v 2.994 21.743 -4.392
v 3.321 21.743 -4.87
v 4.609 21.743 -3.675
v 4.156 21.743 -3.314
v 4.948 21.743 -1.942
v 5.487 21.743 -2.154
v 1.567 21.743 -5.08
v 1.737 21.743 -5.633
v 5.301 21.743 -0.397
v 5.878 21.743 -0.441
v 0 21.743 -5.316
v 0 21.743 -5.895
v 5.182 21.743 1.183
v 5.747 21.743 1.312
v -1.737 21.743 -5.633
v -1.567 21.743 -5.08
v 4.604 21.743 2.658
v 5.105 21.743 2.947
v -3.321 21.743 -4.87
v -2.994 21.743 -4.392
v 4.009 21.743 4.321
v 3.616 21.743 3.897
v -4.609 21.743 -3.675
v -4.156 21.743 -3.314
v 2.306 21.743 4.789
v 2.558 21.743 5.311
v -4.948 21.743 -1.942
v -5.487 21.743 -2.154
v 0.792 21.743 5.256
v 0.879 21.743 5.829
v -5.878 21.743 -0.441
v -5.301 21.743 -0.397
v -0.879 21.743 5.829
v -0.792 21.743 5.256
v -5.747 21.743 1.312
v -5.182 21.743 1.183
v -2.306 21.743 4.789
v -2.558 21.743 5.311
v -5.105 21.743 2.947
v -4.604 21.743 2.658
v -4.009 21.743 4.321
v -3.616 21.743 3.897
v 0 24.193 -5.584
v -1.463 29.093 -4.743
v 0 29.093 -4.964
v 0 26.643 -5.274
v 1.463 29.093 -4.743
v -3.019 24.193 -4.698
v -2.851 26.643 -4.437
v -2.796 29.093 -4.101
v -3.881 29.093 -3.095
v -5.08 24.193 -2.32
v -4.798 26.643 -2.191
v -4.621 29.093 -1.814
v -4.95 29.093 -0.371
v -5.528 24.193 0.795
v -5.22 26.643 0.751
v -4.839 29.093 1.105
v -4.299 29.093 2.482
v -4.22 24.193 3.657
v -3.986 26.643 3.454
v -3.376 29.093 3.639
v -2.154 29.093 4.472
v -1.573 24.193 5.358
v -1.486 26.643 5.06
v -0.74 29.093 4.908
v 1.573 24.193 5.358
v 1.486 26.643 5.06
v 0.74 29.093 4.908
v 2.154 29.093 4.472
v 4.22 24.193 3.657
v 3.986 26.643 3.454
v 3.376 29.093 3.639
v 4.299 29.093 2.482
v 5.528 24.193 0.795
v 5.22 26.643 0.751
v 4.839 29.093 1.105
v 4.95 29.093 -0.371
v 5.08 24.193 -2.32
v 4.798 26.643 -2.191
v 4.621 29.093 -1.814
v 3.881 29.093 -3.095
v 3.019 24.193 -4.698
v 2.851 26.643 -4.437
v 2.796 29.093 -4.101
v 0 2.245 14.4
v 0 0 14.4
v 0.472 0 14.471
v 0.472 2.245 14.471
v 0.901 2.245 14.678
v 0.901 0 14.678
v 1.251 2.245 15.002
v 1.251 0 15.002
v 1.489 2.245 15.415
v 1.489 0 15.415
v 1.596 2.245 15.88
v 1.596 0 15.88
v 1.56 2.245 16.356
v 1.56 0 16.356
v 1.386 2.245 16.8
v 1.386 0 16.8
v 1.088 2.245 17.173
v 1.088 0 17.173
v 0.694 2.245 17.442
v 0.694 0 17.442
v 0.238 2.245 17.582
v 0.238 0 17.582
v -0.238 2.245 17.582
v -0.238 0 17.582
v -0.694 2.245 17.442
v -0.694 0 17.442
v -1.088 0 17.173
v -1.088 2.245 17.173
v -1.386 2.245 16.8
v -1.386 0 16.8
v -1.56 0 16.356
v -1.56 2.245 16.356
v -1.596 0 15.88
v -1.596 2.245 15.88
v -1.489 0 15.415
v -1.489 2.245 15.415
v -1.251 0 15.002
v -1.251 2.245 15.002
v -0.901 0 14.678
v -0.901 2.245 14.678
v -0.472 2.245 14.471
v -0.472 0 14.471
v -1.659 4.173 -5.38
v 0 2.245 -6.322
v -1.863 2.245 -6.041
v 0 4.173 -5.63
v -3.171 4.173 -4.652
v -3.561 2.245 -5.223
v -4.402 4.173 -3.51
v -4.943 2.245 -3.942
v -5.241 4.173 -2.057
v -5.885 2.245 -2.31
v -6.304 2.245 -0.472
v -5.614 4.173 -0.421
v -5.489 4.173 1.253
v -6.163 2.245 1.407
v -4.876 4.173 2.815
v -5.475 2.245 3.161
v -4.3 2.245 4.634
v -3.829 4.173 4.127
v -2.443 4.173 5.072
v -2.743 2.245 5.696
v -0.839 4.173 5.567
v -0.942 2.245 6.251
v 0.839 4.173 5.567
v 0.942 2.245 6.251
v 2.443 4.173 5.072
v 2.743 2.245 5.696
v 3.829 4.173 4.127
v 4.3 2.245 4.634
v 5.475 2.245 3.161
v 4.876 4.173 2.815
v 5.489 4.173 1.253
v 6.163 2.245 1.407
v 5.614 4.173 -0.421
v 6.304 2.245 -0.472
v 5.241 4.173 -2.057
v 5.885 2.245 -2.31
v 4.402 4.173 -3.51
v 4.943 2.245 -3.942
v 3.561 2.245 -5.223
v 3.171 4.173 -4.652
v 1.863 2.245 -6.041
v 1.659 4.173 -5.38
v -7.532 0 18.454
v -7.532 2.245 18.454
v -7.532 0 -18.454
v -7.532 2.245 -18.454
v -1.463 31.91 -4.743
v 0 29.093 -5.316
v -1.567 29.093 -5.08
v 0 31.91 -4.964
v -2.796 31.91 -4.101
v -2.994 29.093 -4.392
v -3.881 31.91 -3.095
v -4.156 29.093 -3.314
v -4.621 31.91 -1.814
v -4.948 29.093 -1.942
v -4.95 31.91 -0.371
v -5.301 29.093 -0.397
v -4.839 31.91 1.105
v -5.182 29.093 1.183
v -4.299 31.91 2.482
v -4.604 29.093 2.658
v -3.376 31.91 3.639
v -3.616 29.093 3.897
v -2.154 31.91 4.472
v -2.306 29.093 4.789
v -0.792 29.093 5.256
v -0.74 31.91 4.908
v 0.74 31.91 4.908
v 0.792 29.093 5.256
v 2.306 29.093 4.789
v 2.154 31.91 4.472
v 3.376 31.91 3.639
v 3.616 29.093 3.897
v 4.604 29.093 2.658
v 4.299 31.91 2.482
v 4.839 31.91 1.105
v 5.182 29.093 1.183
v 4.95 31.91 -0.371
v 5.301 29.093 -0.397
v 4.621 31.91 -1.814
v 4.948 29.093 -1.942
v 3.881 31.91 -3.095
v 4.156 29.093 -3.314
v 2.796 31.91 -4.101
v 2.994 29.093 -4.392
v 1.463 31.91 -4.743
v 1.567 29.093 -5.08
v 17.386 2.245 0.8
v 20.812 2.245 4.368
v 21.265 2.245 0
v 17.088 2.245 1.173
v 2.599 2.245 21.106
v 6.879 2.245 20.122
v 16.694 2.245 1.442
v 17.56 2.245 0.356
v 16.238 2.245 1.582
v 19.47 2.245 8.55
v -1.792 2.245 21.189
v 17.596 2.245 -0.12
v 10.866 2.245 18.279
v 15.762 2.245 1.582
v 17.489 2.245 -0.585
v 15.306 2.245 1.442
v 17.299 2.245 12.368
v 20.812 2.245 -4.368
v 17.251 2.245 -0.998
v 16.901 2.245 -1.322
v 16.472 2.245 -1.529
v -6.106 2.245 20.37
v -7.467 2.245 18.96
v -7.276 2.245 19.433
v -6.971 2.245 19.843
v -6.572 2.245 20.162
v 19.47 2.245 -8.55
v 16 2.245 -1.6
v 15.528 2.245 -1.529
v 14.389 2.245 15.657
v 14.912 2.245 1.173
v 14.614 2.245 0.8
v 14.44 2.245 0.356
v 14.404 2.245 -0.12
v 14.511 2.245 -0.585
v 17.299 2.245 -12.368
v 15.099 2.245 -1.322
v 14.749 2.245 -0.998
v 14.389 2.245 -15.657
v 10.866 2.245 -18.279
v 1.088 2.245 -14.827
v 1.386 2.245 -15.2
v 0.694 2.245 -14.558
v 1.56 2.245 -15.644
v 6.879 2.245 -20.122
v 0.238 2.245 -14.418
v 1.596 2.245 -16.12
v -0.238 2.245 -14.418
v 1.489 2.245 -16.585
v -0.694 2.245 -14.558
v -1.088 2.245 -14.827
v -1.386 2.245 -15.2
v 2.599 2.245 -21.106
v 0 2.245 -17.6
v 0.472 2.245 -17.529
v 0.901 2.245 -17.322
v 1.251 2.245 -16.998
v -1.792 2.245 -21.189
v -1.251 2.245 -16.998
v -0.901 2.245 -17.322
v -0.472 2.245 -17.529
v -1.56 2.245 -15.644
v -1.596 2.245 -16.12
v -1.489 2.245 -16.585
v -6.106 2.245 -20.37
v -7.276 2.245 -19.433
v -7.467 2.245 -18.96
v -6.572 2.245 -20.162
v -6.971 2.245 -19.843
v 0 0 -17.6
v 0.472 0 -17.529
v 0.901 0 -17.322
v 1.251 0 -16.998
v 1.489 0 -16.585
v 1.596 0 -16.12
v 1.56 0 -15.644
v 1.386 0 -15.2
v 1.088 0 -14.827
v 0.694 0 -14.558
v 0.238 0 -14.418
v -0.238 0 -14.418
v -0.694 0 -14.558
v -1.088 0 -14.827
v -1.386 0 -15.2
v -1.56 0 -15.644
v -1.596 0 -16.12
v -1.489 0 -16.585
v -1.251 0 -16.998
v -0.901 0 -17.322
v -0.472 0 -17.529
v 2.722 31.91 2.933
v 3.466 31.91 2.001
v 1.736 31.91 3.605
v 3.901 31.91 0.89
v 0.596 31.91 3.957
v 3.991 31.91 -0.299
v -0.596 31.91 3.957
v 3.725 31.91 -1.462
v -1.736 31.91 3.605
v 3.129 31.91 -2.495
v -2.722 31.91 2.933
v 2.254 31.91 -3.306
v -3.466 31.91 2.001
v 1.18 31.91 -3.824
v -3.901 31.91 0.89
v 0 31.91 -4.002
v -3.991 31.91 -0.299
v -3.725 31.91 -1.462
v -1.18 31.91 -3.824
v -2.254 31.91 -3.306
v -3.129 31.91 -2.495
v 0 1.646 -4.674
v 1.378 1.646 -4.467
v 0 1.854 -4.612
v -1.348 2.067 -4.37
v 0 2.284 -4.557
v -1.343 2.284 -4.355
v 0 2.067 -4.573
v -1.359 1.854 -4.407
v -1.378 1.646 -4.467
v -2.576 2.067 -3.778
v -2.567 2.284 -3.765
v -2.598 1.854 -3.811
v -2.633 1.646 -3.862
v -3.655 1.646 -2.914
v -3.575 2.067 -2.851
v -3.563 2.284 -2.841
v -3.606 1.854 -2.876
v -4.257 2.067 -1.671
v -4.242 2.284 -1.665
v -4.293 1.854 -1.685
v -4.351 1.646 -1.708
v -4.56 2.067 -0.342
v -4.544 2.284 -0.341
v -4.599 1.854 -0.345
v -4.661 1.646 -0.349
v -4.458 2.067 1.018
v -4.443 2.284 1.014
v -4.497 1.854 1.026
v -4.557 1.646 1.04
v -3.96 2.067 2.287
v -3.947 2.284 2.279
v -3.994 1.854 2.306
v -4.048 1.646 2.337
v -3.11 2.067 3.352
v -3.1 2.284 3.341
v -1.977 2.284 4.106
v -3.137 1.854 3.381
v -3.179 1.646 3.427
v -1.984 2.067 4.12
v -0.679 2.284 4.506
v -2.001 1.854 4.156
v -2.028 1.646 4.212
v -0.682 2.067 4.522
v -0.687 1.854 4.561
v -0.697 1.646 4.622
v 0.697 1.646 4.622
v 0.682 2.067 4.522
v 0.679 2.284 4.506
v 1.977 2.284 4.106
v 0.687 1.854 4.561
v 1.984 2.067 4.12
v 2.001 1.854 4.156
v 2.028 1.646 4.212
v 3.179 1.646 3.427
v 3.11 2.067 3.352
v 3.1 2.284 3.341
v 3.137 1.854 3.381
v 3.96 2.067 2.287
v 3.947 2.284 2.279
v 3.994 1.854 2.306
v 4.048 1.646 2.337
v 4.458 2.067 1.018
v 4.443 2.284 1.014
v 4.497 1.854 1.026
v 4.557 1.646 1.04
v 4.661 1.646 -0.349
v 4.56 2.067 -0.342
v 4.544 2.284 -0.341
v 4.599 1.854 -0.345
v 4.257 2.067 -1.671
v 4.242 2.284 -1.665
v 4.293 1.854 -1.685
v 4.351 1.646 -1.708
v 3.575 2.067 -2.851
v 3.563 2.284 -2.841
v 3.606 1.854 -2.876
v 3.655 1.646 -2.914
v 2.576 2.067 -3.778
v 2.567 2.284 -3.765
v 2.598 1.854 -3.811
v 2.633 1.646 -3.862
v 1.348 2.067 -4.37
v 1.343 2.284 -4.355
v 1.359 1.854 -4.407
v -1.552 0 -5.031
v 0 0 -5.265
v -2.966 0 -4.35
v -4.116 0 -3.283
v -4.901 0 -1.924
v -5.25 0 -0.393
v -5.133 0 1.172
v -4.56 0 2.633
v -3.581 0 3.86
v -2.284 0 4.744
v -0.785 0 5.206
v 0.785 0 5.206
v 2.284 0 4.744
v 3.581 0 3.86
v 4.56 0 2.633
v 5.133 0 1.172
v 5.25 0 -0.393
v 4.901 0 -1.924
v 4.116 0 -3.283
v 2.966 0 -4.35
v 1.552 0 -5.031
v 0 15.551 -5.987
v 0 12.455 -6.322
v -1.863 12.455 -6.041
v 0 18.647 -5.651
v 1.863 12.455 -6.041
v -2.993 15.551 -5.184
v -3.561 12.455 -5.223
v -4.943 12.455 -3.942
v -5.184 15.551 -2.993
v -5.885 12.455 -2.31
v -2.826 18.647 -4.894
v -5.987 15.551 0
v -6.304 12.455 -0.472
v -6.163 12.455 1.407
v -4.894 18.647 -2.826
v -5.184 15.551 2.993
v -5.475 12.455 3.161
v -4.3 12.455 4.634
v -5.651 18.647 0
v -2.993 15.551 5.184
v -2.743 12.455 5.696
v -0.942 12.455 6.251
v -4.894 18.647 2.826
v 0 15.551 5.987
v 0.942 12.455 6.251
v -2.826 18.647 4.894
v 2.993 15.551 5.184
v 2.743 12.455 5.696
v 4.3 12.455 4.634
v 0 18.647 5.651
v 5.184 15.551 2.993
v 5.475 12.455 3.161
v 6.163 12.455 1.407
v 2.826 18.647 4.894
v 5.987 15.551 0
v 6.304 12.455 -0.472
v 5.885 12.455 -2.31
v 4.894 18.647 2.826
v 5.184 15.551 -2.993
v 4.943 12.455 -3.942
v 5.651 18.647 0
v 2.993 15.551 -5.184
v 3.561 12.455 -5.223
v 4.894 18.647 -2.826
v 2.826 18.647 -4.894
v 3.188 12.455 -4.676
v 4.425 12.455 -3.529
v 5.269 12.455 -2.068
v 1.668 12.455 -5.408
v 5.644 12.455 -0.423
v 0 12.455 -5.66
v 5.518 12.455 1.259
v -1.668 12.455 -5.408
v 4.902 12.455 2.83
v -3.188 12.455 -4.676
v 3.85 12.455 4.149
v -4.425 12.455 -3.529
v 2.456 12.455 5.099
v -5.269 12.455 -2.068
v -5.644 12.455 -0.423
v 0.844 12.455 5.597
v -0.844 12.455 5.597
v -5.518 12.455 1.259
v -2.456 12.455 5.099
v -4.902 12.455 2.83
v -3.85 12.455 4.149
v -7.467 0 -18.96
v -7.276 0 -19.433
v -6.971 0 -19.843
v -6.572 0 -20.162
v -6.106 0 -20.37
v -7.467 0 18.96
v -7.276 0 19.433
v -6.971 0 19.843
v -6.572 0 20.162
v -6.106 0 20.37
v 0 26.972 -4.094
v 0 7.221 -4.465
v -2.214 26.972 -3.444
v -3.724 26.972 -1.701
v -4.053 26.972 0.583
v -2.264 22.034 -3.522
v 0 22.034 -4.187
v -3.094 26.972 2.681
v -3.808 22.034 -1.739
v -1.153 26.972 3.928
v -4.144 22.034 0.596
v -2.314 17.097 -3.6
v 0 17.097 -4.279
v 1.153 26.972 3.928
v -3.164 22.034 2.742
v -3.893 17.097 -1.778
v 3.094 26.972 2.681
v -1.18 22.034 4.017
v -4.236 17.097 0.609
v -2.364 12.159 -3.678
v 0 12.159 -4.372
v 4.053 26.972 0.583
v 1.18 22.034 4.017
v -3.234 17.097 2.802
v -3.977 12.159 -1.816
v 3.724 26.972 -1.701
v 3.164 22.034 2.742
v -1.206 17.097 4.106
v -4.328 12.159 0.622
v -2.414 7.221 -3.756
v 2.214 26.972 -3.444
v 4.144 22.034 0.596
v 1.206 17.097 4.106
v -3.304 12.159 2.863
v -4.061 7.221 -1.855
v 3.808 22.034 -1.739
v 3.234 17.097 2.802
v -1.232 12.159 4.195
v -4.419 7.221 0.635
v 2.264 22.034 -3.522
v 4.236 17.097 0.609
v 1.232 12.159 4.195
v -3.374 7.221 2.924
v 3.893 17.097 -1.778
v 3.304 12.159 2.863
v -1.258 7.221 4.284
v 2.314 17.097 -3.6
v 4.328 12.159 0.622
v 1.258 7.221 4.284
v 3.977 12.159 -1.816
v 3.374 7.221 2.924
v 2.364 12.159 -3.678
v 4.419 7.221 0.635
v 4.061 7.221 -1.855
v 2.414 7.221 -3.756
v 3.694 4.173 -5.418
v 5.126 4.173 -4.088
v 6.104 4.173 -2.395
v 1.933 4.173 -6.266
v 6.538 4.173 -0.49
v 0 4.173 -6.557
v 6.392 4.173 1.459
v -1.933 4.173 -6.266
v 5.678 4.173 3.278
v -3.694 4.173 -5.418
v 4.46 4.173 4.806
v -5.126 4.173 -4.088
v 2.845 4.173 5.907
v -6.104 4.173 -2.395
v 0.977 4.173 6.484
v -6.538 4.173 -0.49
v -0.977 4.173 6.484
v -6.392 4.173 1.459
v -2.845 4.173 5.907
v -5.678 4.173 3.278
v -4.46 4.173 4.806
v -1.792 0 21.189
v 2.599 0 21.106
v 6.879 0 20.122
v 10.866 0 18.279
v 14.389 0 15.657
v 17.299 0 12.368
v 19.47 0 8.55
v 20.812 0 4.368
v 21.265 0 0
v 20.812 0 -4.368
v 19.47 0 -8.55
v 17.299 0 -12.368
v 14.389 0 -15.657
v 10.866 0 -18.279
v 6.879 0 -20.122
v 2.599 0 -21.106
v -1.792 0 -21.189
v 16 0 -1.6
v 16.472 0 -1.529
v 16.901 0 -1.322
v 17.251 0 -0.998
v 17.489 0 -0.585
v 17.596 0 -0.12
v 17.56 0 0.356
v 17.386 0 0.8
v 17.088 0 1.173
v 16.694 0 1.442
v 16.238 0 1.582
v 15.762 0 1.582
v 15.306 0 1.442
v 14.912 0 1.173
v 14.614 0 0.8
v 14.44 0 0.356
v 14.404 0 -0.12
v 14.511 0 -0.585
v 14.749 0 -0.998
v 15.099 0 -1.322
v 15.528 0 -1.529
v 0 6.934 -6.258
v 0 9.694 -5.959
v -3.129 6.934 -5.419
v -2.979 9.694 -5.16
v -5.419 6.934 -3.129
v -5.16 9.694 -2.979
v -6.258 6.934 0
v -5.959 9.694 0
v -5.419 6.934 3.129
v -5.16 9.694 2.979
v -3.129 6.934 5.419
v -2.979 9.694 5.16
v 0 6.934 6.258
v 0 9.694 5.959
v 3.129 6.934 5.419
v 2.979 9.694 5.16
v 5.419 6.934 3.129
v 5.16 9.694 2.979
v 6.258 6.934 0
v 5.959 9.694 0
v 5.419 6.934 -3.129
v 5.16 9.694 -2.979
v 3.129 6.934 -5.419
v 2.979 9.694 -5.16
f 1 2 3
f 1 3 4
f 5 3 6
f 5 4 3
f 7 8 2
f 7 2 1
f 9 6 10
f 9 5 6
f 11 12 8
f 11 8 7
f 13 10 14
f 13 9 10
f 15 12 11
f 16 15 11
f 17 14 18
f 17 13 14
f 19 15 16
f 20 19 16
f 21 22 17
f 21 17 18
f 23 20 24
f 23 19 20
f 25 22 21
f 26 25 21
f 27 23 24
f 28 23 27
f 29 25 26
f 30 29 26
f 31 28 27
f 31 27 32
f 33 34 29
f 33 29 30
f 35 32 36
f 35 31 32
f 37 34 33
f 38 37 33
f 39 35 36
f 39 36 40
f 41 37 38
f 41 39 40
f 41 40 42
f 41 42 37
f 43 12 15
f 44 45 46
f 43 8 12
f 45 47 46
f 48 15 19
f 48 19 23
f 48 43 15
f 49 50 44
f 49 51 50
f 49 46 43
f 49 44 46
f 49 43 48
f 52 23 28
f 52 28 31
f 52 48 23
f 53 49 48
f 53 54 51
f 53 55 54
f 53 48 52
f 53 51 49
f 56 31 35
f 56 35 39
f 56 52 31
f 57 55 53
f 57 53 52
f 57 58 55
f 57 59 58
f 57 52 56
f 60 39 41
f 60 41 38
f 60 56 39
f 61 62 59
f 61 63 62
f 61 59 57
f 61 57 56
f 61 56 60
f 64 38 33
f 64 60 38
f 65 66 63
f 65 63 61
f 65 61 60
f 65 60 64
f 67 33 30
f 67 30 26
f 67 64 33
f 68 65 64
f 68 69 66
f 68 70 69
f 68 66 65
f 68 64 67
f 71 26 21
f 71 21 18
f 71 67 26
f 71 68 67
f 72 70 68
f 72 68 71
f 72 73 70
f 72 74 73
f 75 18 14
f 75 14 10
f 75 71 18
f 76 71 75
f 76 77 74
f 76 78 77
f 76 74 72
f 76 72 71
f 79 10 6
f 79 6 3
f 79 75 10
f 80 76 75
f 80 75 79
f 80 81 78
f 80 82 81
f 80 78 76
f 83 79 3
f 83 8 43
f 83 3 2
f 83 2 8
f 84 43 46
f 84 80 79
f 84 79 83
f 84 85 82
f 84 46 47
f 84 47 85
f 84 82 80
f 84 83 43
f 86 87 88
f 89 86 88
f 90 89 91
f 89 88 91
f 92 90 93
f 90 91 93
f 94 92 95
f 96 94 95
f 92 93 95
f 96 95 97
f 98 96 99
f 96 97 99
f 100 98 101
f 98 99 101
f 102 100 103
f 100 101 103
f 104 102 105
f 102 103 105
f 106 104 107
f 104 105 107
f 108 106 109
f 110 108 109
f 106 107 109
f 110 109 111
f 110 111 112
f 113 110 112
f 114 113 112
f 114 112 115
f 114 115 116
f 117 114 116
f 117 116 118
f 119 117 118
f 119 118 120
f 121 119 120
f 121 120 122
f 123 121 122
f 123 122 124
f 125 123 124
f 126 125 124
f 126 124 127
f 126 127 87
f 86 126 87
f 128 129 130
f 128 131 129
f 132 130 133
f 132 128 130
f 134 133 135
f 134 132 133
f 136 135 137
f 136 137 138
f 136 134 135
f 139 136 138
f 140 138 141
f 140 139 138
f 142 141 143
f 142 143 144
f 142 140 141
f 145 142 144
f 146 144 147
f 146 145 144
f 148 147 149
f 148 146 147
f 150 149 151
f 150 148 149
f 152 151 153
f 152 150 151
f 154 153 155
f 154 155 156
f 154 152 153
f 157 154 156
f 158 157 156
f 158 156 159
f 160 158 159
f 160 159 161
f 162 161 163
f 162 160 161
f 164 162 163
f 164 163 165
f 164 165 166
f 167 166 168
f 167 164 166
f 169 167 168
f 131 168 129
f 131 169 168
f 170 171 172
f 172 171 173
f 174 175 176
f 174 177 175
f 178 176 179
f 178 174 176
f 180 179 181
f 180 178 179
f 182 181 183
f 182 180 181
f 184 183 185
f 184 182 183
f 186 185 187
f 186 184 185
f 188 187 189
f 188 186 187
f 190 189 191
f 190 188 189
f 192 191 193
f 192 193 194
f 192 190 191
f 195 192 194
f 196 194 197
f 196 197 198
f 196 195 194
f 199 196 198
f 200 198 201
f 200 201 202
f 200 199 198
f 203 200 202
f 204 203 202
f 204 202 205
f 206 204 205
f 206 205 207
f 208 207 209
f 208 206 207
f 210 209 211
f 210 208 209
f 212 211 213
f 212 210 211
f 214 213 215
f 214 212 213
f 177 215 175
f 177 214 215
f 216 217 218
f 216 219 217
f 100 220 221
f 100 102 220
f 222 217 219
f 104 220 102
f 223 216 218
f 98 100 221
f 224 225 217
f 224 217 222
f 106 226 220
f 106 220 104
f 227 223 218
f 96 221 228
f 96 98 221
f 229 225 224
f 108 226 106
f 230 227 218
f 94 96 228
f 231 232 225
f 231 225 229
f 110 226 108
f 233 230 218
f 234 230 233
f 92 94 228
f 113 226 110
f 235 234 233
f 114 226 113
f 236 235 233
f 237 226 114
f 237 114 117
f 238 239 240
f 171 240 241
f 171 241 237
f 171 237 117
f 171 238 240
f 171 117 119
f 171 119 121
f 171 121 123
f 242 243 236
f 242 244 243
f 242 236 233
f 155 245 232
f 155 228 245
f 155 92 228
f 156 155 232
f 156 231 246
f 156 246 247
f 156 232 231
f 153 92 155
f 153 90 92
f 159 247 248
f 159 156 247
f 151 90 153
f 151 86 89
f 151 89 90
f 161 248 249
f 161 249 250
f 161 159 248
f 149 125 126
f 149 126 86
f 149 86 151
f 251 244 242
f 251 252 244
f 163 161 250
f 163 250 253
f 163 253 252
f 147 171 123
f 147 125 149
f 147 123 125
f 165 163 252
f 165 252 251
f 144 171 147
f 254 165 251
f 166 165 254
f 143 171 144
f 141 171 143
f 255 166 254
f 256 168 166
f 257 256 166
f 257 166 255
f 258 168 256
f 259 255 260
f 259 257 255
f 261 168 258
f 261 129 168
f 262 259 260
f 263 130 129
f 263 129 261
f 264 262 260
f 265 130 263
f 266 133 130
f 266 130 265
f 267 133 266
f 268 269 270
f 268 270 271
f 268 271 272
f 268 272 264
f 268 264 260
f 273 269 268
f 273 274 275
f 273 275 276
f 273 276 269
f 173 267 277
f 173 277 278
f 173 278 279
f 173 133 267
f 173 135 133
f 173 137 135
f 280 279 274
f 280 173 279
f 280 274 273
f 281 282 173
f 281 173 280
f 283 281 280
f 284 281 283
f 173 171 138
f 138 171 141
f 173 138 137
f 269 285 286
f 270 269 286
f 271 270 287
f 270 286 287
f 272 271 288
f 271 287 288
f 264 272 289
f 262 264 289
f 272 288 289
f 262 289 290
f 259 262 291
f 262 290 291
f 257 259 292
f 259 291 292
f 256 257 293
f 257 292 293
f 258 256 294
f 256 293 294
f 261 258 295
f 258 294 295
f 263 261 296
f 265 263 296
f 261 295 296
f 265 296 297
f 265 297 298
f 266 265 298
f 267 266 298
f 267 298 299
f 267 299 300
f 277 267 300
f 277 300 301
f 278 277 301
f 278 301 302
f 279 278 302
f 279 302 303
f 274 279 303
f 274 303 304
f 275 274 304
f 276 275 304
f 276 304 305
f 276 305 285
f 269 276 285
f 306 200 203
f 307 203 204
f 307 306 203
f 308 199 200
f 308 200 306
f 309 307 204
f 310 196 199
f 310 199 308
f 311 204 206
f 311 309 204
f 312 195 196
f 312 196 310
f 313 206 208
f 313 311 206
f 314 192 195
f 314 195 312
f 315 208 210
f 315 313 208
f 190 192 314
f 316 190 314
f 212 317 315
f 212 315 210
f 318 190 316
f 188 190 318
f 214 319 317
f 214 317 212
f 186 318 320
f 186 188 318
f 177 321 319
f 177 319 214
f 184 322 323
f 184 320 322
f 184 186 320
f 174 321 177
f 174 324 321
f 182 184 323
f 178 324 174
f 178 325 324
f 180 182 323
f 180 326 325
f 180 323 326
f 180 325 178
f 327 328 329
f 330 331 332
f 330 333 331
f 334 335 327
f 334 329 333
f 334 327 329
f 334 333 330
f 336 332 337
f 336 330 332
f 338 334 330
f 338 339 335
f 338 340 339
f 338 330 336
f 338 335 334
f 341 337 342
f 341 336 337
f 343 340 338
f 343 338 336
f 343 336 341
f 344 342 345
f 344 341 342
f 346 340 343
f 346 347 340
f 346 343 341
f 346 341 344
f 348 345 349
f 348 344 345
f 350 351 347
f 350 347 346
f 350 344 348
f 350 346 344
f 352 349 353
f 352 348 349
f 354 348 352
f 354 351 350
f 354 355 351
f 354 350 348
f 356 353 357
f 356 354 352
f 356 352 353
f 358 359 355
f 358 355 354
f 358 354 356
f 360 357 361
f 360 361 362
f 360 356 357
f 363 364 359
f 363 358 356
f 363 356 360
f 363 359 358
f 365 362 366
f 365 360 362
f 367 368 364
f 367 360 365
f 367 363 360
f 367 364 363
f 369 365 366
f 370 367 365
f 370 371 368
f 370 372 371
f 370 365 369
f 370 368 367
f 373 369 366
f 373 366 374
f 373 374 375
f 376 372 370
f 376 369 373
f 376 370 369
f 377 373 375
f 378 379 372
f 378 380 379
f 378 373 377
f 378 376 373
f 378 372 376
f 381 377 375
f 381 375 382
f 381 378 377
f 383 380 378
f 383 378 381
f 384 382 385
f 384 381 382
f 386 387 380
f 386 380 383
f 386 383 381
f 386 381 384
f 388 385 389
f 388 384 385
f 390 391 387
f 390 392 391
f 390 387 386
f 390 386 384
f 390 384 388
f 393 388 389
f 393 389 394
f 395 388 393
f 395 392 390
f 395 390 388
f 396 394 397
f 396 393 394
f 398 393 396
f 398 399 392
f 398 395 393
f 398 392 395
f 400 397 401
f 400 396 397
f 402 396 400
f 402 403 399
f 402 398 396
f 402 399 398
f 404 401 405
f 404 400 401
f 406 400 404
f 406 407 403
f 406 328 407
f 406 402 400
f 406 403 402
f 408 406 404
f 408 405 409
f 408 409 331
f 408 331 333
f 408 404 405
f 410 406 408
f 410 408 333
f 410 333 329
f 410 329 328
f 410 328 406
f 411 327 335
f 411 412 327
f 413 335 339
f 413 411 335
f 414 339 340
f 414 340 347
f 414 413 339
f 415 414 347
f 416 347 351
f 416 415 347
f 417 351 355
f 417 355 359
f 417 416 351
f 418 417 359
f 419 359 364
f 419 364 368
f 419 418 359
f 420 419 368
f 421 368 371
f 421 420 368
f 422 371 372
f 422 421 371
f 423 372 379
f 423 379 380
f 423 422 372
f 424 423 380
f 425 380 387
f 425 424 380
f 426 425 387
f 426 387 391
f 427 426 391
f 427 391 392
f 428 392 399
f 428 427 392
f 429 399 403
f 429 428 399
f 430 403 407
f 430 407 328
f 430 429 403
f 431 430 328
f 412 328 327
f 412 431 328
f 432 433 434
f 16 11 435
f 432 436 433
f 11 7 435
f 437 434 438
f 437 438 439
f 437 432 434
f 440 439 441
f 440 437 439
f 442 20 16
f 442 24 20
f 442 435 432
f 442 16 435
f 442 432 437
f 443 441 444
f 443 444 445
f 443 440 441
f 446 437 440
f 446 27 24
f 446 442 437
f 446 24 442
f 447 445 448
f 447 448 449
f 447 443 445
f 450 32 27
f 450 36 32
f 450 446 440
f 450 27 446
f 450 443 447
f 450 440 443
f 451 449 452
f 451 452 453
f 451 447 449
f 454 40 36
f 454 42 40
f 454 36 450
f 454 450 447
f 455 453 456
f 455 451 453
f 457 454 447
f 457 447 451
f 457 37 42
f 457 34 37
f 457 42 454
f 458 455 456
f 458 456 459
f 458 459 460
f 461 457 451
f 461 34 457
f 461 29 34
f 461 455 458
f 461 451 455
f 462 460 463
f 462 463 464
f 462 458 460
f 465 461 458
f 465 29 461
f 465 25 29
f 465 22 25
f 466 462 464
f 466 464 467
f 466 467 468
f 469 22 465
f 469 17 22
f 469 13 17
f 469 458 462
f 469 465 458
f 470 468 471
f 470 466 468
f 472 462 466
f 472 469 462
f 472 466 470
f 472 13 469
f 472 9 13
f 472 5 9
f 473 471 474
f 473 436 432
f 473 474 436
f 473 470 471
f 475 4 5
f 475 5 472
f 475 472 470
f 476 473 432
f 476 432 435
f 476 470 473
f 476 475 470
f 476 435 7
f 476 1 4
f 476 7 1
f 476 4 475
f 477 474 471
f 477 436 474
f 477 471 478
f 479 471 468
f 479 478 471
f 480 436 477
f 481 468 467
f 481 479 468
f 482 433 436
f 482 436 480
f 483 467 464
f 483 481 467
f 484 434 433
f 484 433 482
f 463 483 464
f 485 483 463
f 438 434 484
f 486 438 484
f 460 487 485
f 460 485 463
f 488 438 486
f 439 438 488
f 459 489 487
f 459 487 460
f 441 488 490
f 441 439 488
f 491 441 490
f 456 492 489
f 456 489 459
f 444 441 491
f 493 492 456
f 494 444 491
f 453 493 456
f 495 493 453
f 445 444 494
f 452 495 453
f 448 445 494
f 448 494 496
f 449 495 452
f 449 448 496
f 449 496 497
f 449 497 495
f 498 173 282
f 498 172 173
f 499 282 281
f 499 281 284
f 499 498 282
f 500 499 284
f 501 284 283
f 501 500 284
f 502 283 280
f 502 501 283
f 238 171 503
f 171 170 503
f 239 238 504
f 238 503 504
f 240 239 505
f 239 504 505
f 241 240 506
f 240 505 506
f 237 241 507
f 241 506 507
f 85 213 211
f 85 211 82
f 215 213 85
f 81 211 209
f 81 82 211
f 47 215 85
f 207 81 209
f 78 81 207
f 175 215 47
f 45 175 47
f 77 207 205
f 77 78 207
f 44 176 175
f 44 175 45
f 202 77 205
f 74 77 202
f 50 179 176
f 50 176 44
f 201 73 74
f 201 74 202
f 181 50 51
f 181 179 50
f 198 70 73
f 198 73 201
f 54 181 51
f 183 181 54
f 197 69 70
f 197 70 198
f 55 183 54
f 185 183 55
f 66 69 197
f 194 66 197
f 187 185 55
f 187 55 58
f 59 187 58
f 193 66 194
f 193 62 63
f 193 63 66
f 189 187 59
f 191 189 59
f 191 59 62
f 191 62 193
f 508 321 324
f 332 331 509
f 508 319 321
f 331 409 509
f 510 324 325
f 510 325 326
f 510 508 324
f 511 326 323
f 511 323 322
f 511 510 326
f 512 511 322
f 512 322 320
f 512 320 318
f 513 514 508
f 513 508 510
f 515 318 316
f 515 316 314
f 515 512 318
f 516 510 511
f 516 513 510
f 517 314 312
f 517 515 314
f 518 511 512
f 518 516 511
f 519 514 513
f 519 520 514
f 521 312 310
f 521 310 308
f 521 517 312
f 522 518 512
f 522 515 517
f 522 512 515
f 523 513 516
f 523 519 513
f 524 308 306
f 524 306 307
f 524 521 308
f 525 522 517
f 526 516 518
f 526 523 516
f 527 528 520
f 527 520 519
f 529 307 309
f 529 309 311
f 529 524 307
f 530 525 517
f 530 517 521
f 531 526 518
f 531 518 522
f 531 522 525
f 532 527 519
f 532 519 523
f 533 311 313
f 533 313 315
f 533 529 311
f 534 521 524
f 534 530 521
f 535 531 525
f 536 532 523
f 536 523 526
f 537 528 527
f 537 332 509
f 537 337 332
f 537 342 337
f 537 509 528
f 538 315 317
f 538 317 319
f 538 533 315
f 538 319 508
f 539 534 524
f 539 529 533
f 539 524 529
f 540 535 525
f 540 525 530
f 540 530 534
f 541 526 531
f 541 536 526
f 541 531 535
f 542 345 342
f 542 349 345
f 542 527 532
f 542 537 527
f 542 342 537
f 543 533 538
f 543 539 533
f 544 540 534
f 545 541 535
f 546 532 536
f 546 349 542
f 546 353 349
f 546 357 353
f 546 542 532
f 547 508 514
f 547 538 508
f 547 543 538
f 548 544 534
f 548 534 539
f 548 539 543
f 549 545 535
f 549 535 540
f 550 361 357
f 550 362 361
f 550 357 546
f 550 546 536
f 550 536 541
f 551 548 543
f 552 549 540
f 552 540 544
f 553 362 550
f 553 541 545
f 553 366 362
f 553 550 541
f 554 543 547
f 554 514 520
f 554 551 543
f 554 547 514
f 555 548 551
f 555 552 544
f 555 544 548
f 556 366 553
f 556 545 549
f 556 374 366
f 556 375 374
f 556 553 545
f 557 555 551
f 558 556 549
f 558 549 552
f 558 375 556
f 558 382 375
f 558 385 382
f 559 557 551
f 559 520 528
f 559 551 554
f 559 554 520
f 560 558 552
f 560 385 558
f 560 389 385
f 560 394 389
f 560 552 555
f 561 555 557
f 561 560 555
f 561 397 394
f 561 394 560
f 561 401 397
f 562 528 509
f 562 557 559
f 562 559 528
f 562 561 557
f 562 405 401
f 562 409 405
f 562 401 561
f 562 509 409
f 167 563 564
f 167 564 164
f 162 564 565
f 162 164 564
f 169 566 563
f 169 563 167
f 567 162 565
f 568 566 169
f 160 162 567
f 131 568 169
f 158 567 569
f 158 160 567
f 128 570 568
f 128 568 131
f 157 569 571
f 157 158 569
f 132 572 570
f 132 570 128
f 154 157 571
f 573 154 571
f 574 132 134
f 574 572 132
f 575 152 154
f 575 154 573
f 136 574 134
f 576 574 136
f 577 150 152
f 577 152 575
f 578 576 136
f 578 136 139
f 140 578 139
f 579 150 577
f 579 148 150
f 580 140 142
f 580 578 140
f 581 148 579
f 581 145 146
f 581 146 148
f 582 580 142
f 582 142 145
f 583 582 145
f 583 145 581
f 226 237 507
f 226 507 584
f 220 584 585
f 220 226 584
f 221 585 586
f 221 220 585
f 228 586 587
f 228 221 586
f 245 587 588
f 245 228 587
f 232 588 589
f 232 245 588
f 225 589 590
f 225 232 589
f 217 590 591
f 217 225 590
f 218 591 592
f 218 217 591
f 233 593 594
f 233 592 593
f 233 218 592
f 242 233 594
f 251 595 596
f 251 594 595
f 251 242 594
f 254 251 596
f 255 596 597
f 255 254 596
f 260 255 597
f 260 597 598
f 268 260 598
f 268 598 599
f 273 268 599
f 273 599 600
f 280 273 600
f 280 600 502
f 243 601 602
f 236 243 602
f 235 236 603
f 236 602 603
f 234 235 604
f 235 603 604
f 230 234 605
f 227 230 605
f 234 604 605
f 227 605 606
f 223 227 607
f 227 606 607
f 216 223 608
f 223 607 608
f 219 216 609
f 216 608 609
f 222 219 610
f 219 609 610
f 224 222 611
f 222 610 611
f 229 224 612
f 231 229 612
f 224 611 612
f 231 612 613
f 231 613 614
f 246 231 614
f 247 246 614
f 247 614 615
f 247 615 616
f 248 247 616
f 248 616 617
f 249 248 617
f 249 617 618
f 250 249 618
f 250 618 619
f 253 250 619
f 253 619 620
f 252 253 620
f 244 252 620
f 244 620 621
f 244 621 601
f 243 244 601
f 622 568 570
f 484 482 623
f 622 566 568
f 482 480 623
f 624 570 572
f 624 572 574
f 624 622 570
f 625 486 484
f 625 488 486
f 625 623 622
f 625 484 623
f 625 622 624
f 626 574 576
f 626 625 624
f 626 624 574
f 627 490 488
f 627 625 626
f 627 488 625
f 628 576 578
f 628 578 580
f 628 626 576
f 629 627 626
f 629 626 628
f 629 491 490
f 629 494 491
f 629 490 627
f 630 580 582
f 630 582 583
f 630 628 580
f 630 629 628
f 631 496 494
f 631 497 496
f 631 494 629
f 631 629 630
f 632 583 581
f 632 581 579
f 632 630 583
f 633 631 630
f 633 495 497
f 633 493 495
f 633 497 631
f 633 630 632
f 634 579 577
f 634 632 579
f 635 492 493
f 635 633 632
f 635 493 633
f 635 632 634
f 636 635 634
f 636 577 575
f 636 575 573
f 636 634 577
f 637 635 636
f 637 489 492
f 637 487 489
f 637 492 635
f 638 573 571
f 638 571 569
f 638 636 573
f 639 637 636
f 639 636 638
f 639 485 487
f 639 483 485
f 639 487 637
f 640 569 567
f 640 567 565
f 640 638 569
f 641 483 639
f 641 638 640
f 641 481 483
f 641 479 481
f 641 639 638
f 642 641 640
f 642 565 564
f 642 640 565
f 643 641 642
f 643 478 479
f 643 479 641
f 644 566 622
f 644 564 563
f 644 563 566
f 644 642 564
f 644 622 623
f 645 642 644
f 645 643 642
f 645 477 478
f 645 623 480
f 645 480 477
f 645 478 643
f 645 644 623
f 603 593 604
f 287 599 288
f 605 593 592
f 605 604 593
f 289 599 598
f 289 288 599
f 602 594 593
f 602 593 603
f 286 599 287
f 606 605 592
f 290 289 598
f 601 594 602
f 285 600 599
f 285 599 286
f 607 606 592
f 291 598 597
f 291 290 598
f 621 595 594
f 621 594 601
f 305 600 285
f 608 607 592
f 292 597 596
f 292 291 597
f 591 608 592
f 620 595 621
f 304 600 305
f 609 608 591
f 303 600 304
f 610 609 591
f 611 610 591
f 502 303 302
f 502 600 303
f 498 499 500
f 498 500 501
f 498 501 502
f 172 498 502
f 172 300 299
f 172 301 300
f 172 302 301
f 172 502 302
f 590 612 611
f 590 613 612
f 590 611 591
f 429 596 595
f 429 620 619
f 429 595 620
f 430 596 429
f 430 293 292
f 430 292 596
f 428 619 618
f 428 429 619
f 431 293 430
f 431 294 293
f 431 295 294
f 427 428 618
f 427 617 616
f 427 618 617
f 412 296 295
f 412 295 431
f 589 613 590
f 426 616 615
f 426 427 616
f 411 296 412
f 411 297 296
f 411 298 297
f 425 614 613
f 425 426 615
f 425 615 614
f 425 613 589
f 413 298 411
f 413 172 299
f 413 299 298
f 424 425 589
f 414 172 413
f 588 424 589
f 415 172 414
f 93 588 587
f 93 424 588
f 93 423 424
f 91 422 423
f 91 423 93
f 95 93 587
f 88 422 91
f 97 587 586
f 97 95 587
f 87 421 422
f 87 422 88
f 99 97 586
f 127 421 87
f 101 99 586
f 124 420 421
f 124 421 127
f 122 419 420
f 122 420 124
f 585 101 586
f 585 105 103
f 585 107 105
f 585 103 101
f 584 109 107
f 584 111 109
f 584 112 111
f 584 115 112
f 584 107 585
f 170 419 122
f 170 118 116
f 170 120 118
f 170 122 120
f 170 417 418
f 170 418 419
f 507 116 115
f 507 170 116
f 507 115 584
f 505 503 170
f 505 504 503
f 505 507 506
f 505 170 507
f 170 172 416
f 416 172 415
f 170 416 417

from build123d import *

# Parameters (mm, degrees)
SKETCH_2_R          = 1.6
CUT_EXTRUDE_1_DEPTH = 10
SKETCH_3_R          = 1.6
CUT_EXTRUDE_2_DEPTH = 10
FILLET_1_R          = 2


with BuildPart() as part:
    # 草图1 → 旋转1 (revolve)
    with BuildSketch(Plane.XY, mode=Mode.PRIVATE) as revolve_1_sk:
        with BuildLine():
            Line((4.67441793, 1.645613509), (5.265095642, 0))
            Line((5.265095642, 0), (21.265095642, 0))
            Line((21.265095642, 0), (21.265095642, 2.244719328))
            Line((21.265095642, 2.244719328), (14.3, 2.244719328))
            Line((14.3, 2.244719328), (8.034357928, 2.244719328))
            Line((8.034357928, 2.244719328), (6.321891904, 2.244719328))
            Line((6.321891904, 2.244719328), (5.629770002, 4.172953844))
            Line((5.629770002, 4.172953844), (6.556827402, 4.172953844))
            Line((6.556827402, 4.172953844), (5.659767787, 12.454719003))
            Line((5.659767787, 12.454719003), (6.321891904, 12.454719003))
            Line((6.321891904, 12.454719003), (5.315776989, 21.743296168))
            Line((5.315776989, 21.743296168), (5.894592711, 21.743296168))
            Line((5.894592711, 21.743296168), (4.963884004, 29.092954865))
            Line((4.963884004, 29.092954865), (5.315776989, 29.092954865))
            Line((5.315776989, 29.092954865), (4.963884004, 31.909590534))
            Line((4.963884004, 31.909590534), (4.001695177, 31.909590534))
            Line((4.001695177, 31.909590534), (4.557178871, 2.283793527))
            ThreePointArc((4.557178871, 2.283793527), (4.589745294, 1.959917343), (4.67441793, 1.645613509))
        make_face()
    revolve(revolve_1_sk.sketch.rotate(Axis((0, 0, 0), (0, 1, 0)), 90), axis=Axis((0, 0, 0), (0, 1, 0)))

    # 草图2 → 切除-拉伸1 (cut)
    with BuildSketch(Plane.XZ):
        with Locations(Location((-16, 0, 0), (0, 0, 270))):
            Circle(SKETCH_2_R)
        with Locations(Location((0, -16, 0), (0, 0, 270))):
            Circle(SKETCH_2_R)
        with Locations(Location((16, 0, 0), (0, 0, 270))):
            Circle(SKETCH_2_R)
        with Locations(Location((0, 16, 0), (0, 0, 270))):
            Circle(SKETCH_2_R)
    extrude(amount=-CUT_EXTRUDE_1_DEPTH, mode=Mode.SUBTRACT)

    # 草图3 → 切除-拉伸2 (cut)
    with BuildSketch(Plane(origin=(0, 2.244719328, 0), x_dir=(1, 0, 0), z_dir=(0, 1, 0))):
        with BuildLine():
            ThreePointArc((-7.531954162, 19.886527076), (-21.265095642, 0), (-7.531954162, -19.886527076))
            Line((-7.531954162, -19.886527076), (-7.531954162, 19.886527076))
        make_face()
        with Locations((-16, 0)):
            Circle(SKETCH_3_R, mode=Mode.SUBTRACT)
    extrude(amount=-CUT_EXTRUDE_2_DEPTH, mode=Mode.SUBTRACT)

    # 圆角1
    fillet_1_edges = [part.edges().sort_by_distance(p)[0] for p in [
        (-7.531954162, 1.122359664, 19.886527076),
        (-7.531954162, 1.122359664, -19.886527076),
    ]]
    fillet(fillet_1_edges, radius=FILLET_1_R)


solid = part.part
